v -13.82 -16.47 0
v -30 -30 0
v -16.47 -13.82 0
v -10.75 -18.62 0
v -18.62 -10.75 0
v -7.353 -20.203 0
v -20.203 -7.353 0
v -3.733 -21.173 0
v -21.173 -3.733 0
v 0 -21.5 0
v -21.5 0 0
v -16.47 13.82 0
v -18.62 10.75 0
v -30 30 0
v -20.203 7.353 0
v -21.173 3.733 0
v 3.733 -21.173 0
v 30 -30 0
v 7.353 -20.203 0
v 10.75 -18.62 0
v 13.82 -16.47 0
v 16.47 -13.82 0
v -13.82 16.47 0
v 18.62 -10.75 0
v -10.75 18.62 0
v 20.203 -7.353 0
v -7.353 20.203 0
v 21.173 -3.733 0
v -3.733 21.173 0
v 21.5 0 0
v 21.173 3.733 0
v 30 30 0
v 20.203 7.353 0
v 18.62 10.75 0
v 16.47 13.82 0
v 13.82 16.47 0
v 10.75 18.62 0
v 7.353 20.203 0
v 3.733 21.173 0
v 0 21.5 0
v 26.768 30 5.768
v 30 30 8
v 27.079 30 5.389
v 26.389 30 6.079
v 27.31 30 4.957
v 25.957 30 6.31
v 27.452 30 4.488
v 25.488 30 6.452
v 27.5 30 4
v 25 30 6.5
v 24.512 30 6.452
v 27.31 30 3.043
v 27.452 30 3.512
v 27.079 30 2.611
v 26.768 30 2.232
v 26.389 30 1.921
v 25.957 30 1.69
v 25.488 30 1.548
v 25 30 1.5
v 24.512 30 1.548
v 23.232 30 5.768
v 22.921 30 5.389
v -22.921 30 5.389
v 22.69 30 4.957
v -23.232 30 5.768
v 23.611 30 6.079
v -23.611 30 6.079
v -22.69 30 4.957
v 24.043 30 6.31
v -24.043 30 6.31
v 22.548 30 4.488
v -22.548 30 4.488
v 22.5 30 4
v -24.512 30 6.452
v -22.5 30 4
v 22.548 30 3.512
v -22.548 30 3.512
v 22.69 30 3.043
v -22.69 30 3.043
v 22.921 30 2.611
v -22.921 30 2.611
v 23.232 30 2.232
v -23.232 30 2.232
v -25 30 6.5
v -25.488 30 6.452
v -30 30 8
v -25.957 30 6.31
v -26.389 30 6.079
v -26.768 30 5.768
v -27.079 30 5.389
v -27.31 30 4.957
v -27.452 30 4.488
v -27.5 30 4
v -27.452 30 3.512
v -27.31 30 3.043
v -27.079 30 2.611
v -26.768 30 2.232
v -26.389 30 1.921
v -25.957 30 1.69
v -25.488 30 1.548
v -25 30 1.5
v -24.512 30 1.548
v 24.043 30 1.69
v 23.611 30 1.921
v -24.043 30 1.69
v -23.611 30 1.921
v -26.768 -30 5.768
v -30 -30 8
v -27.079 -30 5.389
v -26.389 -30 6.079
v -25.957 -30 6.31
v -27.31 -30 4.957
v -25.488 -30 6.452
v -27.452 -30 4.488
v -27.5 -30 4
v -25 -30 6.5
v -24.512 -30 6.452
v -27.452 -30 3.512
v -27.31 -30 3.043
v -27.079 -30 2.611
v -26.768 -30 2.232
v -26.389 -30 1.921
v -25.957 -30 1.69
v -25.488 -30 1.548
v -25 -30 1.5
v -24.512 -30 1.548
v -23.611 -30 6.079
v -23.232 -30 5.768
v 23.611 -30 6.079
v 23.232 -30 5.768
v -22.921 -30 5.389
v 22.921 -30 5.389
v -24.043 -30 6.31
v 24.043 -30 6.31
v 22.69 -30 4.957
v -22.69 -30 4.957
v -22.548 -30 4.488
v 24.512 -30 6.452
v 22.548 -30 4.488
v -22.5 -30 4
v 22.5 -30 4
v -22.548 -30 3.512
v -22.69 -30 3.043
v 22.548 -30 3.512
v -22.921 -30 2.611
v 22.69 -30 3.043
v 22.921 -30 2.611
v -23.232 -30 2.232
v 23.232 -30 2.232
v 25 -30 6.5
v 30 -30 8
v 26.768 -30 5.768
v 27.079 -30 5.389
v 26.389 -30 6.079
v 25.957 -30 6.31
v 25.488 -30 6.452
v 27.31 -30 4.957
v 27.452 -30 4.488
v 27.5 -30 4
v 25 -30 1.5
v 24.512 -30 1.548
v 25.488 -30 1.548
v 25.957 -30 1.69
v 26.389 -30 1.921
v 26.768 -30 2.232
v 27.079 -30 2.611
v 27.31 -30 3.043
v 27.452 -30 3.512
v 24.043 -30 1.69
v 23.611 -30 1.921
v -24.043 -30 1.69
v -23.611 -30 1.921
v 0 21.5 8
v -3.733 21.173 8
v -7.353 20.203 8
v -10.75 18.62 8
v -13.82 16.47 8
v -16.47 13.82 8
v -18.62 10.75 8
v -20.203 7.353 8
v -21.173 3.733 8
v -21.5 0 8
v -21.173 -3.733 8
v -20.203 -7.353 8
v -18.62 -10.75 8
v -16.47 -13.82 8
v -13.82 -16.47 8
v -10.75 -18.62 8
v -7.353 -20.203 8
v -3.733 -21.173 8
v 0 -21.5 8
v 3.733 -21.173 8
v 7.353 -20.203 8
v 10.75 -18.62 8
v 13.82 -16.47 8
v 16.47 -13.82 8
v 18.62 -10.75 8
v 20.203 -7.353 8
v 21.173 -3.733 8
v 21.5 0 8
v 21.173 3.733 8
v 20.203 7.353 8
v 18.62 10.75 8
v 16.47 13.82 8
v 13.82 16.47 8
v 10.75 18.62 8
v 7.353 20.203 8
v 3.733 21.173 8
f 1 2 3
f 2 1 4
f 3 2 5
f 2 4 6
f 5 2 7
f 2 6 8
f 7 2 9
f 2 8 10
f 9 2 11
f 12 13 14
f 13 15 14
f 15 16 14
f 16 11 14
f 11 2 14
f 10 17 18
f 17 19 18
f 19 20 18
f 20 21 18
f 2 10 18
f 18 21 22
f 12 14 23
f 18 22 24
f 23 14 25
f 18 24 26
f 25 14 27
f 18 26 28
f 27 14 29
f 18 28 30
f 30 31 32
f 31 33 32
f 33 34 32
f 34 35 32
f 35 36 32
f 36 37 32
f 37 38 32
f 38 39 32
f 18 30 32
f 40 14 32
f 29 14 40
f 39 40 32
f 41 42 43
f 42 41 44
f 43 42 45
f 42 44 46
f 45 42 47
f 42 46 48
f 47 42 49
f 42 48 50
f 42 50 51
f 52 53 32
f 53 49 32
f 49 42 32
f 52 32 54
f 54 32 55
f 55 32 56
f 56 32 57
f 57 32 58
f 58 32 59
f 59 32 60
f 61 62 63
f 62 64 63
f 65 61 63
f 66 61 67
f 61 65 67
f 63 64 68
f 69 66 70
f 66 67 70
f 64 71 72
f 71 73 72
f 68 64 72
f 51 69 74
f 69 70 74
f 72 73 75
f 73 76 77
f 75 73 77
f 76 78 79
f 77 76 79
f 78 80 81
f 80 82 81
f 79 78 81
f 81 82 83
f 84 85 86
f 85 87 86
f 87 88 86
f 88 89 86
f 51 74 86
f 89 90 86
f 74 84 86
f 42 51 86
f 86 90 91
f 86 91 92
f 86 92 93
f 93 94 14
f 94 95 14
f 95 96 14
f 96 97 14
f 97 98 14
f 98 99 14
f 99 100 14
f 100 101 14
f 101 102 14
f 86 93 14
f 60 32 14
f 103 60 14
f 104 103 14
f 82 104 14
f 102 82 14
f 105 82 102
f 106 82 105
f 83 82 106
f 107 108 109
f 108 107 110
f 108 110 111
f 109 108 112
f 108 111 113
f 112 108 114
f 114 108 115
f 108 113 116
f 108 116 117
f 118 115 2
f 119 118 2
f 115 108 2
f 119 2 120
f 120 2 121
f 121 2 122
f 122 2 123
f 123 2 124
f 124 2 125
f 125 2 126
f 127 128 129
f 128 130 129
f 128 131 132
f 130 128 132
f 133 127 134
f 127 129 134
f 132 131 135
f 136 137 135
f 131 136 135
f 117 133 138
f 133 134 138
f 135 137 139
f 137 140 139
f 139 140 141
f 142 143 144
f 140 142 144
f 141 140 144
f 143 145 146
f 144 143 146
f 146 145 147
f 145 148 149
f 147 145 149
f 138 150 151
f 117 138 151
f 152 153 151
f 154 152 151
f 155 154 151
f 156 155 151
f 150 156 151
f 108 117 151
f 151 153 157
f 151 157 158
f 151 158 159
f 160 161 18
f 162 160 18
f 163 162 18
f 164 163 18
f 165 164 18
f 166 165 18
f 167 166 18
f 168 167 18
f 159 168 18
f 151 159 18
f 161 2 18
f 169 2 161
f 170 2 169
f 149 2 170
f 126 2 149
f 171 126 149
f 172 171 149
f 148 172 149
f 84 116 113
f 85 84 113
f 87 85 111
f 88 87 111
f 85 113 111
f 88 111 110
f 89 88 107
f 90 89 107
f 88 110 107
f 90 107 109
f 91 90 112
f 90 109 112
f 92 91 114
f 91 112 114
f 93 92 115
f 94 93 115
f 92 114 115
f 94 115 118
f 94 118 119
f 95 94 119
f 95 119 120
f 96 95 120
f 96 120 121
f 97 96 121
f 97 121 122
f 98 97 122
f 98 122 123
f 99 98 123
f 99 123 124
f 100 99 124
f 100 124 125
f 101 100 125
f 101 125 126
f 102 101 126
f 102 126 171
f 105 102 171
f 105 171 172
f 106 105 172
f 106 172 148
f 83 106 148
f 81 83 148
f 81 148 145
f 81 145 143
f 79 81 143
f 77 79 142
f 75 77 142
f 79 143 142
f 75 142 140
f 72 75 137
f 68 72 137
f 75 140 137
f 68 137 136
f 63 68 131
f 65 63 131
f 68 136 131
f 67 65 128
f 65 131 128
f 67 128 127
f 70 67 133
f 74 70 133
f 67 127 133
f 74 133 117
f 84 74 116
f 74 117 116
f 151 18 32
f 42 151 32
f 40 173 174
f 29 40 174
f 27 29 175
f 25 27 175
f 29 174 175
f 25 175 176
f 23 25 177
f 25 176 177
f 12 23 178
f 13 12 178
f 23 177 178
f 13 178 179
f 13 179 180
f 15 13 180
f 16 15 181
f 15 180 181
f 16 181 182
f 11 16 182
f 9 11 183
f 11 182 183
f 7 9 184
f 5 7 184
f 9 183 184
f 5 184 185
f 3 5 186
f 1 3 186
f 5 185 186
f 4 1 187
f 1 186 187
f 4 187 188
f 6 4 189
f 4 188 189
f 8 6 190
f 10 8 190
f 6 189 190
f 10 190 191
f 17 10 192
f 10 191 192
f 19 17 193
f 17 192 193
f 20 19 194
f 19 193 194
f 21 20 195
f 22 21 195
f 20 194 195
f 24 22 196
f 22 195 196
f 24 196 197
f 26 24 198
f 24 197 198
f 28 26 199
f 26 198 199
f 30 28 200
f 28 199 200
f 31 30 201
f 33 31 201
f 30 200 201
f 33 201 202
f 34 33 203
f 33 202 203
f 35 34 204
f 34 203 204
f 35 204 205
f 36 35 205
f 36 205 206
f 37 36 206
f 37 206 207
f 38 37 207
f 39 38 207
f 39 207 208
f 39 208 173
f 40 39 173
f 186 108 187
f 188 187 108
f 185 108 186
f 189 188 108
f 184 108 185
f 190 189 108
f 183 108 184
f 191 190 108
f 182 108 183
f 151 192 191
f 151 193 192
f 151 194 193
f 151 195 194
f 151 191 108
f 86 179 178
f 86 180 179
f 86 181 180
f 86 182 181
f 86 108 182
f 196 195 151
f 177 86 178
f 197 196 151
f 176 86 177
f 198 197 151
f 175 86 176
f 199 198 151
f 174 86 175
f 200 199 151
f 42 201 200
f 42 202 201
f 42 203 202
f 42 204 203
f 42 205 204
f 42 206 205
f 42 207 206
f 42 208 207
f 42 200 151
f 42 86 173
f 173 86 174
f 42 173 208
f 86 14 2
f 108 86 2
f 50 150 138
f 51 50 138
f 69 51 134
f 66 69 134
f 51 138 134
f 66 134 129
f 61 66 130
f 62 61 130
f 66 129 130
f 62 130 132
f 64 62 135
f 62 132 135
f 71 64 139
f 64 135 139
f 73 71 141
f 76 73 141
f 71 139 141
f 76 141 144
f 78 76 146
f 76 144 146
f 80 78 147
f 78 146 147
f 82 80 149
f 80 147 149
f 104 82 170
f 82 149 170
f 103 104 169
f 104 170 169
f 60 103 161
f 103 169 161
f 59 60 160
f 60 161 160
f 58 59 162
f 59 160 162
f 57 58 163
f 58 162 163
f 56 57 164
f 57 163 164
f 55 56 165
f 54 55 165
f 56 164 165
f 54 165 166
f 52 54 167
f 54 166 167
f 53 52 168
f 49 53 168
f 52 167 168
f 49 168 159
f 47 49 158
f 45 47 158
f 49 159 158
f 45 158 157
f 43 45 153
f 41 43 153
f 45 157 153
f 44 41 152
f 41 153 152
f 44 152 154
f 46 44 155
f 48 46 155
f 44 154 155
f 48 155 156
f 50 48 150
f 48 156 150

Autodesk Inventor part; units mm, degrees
ref_plane "YZ Plane" through (0, 0, 0) normal (1, 0, 0) x (0, 1, 0)
ref_plane "XZ Plane" through (0, 0, 0) normal (0, 1, 0) x (-1, 0, 0)
ref_plane "XY Plane" through (0, 0, 0) normal (0, 0, 1) x (1, 0, 0)
sketch "Sketch1" plane through (0, 0, 0) normal (0, 0, 1) x (1, 0, 0)
  line L0 (-30, -30) -> (30, -30)
  line L1 (30, -30) -> (30, 30)
  line L2 (30, 30) -> (-30, 30)
  line L3 (-30, 30) -> (-30, -30)
  line L4 (-30, -30) -> (30, 30) construction
  line L5 (30, -30) -> (-30, 30) construction
  point P0 (0, 0)
  dimension "d0" = 60
  dimension "d1" = 60
extrude "Extrusion1" add sketch "Sketch1" along normal blind 8
hole "Hole1" at (0, 0, 0) direction (0, 0, 1) diameter 43 end through all
sketch "Sketch2" plane through (-30, 30, 0) normal (0, 1, 0) x (1, 0, 0)
  line L0 (60, 0) -> (0, 0) projected
  line L1 (0, 0) -> (0, -8) projected
  line L2 (60, -8) -> (0, -8) projected
  line L3 (60, 0) -> (60, -8) projected
  point P0 (30, 0)
  point P1 (55, -4)
  point P2 (5, -4)
  dimension "d11" = 5
  dimension "d12" = 5
hole "Hole2" at (-25, 30, 4) at (25, 30, 4) direction (0, -1, 0) diameter 5 end through all
equation "\"d12\" = d11"
properties part number "SpacerSmall"
